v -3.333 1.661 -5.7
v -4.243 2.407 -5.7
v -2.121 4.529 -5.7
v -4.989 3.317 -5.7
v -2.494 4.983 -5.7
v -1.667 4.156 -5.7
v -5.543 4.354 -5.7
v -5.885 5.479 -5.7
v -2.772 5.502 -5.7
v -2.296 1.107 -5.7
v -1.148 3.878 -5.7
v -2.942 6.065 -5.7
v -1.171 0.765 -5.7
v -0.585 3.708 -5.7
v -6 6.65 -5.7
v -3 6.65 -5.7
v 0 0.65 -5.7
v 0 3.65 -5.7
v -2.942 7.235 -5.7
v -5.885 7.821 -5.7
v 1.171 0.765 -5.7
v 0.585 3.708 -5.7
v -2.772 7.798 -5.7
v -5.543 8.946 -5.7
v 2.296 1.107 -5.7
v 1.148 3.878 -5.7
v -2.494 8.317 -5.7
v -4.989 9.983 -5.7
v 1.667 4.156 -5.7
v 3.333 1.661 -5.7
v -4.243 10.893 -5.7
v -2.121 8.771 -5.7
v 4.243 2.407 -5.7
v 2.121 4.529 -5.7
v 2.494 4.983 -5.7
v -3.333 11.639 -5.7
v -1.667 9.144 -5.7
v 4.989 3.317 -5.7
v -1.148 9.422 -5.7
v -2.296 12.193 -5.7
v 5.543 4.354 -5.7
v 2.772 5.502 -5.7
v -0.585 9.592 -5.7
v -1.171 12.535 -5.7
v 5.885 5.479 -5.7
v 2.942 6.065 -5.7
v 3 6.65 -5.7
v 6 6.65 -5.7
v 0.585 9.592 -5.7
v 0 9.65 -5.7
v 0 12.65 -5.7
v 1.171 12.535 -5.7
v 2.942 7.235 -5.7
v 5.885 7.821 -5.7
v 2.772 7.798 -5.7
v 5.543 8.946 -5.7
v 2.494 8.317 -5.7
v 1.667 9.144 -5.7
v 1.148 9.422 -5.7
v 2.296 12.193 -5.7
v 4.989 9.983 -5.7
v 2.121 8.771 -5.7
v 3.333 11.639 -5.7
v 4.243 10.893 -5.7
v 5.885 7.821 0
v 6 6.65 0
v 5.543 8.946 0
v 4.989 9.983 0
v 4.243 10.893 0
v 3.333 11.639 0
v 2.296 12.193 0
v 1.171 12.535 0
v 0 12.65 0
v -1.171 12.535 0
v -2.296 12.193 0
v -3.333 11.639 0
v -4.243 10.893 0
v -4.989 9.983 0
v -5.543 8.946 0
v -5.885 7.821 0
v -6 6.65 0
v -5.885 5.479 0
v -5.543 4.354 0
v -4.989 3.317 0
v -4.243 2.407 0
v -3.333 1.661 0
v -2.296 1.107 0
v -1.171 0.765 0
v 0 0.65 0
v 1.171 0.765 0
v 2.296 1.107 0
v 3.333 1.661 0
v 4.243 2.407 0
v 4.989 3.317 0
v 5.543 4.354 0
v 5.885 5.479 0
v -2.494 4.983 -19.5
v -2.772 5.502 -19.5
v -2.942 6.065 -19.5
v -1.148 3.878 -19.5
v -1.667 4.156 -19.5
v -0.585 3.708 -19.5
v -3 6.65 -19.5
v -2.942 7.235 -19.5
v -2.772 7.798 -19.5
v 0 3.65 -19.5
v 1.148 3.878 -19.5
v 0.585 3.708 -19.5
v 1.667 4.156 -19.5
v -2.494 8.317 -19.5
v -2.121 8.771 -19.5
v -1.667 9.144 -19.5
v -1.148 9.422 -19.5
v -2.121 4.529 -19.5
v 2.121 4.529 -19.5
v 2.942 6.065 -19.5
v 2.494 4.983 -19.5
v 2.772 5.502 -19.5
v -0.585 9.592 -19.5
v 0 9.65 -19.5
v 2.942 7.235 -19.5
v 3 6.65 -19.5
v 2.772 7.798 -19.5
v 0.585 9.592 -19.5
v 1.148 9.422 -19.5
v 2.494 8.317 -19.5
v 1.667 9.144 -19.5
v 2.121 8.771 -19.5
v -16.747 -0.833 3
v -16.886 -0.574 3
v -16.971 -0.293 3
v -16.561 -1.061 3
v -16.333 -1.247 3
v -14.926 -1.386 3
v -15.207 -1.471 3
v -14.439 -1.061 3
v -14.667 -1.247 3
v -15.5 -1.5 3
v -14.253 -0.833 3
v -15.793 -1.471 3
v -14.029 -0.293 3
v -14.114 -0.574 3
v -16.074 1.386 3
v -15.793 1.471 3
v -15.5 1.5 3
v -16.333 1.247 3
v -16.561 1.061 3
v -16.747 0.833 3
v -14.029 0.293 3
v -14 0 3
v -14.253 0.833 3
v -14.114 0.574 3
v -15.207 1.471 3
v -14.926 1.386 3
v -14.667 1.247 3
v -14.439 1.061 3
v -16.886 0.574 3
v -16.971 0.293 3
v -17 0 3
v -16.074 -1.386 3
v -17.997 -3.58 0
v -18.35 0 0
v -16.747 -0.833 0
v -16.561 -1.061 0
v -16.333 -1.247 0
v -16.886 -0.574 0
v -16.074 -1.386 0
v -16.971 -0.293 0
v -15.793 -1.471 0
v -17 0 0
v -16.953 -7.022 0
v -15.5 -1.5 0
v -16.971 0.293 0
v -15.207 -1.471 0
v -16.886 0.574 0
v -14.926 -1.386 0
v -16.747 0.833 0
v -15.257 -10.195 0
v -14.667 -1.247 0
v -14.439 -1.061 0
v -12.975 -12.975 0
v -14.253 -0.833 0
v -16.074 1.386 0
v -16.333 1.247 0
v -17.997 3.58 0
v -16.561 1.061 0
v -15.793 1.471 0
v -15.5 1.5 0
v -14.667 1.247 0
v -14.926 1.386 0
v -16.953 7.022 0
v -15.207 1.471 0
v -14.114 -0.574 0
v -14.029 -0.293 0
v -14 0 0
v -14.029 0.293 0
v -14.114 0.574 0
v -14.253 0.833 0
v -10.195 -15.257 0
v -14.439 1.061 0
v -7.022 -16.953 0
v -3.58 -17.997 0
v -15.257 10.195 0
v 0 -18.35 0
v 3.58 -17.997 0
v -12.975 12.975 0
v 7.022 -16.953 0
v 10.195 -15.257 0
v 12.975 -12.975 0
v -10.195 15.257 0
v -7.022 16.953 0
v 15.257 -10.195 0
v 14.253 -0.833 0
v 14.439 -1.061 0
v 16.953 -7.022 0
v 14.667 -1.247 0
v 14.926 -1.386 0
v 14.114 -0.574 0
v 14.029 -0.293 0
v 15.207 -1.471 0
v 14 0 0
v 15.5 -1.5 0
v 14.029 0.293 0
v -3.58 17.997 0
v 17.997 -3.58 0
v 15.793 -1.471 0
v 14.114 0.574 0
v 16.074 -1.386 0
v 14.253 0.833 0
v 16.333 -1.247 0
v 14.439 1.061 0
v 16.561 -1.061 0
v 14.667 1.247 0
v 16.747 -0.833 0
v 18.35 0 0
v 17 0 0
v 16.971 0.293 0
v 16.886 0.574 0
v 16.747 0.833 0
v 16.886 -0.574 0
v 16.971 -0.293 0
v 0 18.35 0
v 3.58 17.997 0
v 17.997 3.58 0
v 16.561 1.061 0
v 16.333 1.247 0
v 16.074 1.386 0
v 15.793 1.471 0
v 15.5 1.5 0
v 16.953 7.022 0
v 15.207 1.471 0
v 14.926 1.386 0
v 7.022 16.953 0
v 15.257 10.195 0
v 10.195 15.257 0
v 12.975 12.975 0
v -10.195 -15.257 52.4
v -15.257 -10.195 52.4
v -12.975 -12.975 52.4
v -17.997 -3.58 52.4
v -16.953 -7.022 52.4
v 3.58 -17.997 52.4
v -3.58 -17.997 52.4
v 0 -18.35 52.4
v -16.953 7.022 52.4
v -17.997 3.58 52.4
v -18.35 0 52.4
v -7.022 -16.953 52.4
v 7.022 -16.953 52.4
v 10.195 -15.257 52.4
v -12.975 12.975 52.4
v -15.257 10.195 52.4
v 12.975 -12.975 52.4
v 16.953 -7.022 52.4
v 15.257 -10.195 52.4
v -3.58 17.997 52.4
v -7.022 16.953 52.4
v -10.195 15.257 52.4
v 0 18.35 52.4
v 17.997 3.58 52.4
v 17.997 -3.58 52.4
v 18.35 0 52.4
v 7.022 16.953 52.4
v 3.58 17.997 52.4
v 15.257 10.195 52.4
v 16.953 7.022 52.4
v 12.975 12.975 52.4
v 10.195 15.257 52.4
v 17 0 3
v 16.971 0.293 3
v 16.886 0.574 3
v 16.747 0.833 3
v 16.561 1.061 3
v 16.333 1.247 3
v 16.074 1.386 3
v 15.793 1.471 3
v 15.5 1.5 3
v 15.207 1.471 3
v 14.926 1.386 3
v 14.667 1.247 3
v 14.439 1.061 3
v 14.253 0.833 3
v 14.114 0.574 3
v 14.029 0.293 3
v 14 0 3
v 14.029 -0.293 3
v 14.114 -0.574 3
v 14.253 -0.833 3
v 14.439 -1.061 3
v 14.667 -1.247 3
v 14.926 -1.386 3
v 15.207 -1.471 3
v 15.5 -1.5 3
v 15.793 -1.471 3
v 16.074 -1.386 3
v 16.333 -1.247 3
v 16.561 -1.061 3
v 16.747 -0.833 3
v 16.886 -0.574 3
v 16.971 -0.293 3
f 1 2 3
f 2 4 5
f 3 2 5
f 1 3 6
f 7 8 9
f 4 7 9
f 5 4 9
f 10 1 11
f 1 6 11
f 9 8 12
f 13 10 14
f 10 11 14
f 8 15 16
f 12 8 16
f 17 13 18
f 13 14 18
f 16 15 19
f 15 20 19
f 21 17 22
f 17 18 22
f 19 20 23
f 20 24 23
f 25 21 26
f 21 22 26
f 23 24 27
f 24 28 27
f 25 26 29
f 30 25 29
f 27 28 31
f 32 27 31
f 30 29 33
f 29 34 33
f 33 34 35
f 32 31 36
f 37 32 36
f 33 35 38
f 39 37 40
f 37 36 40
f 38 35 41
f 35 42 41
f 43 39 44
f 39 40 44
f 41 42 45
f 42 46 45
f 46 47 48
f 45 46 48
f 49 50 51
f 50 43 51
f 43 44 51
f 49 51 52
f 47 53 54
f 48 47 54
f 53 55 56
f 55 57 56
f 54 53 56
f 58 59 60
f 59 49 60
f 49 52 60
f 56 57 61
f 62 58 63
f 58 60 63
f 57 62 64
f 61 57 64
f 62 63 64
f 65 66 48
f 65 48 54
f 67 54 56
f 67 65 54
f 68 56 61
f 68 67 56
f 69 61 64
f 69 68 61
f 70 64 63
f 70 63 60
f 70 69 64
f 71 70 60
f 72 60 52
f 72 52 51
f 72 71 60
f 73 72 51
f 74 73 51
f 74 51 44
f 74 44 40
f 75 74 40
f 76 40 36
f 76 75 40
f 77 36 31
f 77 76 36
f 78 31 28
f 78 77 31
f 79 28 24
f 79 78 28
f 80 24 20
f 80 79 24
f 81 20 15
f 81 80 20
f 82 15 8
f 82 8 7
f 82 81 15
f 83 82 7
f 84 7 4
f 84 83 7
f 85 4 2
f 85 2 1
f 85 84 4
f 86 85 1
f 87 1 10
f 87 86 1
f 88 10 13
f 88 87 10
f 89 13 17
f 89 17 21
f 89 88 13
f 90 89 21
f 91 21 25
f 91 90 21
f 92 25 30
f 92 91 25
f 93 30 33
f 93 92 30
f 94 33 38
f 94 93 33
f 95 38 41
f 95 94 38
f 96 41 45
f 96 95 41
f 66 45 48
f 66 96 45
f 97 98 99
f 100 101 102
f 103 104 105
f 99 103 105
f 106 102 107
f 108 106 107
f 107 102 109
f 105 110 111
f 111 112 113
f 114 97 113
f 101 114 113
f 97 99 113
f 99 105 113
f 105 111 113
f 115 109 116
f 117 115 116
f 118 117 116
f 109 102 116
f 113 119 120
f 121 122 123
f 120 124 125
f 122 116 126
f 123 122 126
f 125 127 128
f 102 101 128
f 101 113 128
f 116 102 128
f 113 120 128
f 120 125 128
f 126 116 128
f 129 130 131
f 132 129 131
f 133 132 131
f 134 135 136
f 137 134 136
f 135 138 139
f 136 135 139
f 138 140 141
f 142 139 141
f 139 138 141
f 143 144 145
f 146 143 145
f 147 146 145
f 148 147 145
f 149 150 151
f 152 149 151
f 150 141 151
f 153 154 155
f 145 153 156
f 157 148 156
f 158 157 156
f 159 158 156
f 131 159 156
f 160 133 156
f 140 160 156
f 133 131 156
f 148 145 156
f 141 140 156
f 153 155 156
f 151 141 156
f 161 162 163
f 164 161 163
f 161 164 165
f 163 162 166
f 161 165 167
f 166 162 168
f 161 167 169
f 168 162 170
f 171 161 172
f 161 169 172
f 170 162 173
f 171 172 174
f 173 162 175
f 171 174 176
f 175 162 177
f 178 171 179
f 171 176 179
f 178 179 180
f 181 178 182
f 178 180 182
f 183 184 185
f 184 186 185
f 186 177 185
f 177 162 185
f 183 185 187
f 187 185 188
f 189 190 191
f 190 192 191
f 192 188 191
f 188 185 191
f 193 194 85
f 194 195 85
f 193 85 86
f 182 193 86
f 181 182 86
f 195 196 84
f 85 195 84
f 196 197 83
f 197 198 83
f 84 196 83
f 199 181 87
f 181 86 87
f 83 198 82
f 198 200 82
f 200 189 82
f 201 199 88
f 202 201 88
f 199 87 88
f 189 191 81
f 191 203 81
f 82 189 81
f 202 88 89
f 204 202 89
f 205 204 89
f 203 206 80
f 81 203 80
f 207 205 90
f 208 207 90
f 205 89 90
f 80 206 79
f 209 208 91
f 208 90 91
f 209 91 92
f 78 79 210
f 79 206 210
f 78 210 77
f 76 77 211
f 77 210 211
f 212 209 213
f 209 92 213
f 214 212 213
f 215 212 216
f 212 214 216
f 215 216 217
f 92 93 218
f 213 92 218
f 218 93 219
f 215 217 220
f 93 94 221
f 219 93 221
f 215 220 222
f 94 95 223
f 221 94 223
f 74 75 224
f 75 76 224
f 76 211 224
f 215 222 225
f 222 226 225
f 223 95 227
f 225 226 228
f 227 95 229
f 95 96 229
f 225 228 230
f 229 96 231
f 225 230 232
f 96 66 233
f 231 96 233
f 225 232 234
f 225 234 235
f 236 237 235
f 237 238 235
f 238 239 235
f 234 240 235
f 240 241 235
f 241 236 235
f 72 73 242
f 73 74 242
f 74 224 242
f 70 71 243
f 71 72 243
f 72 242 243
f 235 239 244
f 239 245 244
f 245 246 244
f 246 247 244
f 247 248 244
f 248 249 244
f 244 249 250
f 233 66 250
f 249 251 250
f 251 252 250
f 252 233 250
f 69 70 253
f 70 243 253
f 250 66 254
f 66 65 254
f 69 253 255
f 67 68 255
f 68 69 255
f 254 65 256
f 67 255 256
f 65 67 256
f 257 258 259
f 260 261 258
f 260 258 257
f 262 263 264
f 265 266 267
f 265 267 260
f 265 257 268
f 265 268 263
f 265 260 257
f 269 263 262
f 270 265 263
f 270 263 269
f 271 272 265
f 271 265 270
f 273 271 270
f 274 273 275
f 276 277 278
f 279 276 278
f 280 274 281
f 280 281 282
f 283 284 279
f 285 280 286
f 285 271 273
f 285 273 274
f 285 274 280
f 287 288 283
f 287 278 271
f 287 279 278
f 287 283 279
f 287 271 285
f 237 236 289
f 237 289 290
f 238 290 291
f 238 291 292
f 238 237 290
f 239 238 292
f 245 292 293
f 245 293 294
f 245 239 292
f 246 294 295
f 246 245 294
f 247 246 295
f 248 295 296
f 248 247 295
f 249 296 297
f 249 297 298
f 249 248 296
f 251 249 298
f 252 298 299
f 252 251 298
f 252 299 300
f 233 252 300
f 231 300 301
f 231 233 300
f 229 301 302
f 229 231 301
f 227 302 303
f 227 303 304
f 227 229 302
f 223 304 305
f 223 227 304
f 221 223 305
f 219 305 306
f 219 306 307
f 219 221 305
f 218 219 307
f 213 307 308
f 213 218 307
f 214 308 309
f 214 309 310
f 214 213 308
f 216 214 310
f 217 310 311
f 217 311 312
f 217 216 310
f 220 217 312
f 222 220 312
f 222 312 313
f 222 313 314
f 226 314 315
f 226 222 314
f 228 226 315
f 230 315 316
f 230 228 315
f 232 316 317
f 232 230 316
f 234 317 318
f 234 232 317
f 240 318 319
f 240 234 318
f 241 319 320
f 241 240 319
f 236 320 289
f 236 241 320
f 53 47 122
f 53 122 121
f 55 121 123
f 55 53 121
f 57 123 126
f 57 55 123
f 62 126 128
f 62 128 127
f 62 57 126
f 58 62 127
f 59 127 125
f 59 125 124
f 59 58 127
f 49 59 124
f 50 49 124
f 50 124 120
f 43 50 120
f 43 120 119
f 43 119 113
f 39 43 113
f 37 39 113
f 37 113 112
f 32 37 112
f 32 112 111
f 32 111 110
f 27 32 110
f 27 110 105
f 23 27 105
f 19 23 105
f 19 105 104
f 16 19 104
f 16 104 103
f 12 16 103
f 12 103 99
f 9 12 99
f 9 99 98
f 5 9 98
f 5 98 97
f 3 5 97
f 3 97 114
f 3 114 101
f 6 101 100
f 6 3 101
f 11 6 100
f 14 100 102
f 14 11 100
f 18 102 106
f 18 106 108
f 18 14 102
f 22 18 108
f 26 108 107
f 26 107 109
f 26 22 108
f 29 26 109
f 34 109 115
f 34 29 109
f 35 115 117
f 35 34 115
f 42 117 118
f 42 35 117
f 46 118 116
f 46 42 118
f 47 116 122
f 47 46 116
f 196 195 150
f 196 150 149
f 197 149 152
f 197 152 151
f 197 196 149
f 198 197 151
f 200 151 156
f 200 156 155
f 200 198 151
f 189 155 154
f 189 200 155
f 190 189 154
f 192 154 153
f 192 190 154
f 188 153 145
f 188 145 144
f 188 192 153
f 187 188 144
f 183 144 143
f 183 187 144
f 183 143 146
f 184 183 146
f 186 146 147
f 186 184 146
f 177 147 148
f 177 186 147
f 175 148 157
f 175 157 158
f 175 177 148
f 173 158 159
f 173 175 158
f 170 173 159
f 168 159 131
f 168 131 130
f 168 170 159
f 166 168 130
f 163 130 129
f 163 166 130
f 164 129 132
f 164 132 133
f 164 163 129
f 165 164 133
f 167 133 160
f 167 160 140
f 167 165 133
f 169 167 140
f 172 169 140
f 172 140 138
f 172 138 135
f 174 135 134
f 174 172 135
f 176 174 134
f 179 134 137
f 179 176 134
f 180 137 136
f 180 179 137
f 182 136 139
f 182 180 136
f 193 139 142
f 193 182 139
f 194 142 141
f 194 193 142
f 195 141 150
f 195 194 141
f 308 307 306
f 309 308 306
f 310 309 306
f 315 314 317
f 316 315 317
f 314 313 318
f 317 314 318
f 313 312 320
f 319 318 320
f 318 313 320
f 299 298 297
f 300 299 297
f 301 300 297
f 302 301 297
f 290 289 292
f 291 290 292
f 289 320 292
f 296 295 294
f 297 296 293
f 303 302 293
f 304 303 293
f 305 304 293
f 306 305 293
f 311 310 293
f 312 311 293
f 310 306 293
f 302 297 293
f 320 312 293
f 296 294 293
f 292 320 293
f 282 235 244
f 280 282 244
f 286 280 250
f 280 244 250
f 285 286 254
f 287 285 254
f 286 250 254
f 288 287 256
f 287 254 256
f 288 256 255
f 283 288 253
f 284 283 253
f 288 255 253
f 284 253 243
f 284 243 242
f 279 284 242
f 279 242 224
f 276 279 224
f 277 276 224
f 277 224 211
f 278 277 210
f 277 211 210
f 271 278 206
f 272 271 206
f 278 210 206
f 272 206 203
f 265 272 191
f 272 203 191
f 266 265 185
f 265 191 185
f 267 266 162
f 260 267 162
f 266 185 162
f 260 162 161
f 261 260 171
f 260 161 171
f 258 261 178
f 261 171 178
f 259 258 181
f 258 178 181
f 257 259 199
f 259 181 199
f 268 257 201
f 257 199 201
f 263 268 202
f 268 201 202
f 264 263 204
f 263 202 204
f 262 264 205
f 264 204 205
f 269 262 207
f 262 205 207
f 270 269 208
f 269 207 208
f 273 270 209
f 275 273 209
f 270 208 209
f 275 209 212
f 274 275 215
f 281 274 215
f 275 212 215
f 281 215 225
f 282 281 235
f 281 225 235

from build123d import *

# Parameters (mm, degrees)
SKETCH_1_R          = 18.35
EXTRUDE_1_DEPTH     = 52.4
SKETCH_1_4_R        = 6
EXTRUDE_2_DEPTH     = 5.7
SKETCH_1_5_R        = 3
EXTRUDE_3_DEPTH     = 19.5
SKETCH_1_6_R        = 1.5
CUT_EXTRUDE_1_DEPTH = 3


with BuildPart() as part:
    # 草图1 → 凸台-拉伸1 (new body)
    with BuildSketch(Plane.XY):
        Circle(SKETCH_1_R)
    extrude(amount=EXTRUDE_1_DEPTH)

    # 草图1<4> → 凸台-拉伸2 (add)
    with BuildSketch(Plane.XY):
        with Locations((0, 6.65)):
            Circle(SKETCH_1_4_R)
    extrude(amount=-EXTRUDE_2_DEPTH)

    # 草图1<5> → 凸台-拉伸3 (add)
    with BuildSketch(Plane.XY):
        with Locations((0, 6.65)):
            Circle(SKETCH_1_5_R)
    extrude(amount=-EXTRUDE_3_DEPTH)

    # 草图1<6> → 切除-拉伸1 (cut)
    with BuildSketch(Plane.XY):
        with Locations((-15.5, 0)):
            Circle(SKETCH_1_6_R)
        with Locations((15.5, 0)):
            Circle(SKETCH_1_6_R)
    extrude(amount=CUT_EXTRUDE_1_DEPTH, mode=Mode.SUBTRACT)


solid = part.part
